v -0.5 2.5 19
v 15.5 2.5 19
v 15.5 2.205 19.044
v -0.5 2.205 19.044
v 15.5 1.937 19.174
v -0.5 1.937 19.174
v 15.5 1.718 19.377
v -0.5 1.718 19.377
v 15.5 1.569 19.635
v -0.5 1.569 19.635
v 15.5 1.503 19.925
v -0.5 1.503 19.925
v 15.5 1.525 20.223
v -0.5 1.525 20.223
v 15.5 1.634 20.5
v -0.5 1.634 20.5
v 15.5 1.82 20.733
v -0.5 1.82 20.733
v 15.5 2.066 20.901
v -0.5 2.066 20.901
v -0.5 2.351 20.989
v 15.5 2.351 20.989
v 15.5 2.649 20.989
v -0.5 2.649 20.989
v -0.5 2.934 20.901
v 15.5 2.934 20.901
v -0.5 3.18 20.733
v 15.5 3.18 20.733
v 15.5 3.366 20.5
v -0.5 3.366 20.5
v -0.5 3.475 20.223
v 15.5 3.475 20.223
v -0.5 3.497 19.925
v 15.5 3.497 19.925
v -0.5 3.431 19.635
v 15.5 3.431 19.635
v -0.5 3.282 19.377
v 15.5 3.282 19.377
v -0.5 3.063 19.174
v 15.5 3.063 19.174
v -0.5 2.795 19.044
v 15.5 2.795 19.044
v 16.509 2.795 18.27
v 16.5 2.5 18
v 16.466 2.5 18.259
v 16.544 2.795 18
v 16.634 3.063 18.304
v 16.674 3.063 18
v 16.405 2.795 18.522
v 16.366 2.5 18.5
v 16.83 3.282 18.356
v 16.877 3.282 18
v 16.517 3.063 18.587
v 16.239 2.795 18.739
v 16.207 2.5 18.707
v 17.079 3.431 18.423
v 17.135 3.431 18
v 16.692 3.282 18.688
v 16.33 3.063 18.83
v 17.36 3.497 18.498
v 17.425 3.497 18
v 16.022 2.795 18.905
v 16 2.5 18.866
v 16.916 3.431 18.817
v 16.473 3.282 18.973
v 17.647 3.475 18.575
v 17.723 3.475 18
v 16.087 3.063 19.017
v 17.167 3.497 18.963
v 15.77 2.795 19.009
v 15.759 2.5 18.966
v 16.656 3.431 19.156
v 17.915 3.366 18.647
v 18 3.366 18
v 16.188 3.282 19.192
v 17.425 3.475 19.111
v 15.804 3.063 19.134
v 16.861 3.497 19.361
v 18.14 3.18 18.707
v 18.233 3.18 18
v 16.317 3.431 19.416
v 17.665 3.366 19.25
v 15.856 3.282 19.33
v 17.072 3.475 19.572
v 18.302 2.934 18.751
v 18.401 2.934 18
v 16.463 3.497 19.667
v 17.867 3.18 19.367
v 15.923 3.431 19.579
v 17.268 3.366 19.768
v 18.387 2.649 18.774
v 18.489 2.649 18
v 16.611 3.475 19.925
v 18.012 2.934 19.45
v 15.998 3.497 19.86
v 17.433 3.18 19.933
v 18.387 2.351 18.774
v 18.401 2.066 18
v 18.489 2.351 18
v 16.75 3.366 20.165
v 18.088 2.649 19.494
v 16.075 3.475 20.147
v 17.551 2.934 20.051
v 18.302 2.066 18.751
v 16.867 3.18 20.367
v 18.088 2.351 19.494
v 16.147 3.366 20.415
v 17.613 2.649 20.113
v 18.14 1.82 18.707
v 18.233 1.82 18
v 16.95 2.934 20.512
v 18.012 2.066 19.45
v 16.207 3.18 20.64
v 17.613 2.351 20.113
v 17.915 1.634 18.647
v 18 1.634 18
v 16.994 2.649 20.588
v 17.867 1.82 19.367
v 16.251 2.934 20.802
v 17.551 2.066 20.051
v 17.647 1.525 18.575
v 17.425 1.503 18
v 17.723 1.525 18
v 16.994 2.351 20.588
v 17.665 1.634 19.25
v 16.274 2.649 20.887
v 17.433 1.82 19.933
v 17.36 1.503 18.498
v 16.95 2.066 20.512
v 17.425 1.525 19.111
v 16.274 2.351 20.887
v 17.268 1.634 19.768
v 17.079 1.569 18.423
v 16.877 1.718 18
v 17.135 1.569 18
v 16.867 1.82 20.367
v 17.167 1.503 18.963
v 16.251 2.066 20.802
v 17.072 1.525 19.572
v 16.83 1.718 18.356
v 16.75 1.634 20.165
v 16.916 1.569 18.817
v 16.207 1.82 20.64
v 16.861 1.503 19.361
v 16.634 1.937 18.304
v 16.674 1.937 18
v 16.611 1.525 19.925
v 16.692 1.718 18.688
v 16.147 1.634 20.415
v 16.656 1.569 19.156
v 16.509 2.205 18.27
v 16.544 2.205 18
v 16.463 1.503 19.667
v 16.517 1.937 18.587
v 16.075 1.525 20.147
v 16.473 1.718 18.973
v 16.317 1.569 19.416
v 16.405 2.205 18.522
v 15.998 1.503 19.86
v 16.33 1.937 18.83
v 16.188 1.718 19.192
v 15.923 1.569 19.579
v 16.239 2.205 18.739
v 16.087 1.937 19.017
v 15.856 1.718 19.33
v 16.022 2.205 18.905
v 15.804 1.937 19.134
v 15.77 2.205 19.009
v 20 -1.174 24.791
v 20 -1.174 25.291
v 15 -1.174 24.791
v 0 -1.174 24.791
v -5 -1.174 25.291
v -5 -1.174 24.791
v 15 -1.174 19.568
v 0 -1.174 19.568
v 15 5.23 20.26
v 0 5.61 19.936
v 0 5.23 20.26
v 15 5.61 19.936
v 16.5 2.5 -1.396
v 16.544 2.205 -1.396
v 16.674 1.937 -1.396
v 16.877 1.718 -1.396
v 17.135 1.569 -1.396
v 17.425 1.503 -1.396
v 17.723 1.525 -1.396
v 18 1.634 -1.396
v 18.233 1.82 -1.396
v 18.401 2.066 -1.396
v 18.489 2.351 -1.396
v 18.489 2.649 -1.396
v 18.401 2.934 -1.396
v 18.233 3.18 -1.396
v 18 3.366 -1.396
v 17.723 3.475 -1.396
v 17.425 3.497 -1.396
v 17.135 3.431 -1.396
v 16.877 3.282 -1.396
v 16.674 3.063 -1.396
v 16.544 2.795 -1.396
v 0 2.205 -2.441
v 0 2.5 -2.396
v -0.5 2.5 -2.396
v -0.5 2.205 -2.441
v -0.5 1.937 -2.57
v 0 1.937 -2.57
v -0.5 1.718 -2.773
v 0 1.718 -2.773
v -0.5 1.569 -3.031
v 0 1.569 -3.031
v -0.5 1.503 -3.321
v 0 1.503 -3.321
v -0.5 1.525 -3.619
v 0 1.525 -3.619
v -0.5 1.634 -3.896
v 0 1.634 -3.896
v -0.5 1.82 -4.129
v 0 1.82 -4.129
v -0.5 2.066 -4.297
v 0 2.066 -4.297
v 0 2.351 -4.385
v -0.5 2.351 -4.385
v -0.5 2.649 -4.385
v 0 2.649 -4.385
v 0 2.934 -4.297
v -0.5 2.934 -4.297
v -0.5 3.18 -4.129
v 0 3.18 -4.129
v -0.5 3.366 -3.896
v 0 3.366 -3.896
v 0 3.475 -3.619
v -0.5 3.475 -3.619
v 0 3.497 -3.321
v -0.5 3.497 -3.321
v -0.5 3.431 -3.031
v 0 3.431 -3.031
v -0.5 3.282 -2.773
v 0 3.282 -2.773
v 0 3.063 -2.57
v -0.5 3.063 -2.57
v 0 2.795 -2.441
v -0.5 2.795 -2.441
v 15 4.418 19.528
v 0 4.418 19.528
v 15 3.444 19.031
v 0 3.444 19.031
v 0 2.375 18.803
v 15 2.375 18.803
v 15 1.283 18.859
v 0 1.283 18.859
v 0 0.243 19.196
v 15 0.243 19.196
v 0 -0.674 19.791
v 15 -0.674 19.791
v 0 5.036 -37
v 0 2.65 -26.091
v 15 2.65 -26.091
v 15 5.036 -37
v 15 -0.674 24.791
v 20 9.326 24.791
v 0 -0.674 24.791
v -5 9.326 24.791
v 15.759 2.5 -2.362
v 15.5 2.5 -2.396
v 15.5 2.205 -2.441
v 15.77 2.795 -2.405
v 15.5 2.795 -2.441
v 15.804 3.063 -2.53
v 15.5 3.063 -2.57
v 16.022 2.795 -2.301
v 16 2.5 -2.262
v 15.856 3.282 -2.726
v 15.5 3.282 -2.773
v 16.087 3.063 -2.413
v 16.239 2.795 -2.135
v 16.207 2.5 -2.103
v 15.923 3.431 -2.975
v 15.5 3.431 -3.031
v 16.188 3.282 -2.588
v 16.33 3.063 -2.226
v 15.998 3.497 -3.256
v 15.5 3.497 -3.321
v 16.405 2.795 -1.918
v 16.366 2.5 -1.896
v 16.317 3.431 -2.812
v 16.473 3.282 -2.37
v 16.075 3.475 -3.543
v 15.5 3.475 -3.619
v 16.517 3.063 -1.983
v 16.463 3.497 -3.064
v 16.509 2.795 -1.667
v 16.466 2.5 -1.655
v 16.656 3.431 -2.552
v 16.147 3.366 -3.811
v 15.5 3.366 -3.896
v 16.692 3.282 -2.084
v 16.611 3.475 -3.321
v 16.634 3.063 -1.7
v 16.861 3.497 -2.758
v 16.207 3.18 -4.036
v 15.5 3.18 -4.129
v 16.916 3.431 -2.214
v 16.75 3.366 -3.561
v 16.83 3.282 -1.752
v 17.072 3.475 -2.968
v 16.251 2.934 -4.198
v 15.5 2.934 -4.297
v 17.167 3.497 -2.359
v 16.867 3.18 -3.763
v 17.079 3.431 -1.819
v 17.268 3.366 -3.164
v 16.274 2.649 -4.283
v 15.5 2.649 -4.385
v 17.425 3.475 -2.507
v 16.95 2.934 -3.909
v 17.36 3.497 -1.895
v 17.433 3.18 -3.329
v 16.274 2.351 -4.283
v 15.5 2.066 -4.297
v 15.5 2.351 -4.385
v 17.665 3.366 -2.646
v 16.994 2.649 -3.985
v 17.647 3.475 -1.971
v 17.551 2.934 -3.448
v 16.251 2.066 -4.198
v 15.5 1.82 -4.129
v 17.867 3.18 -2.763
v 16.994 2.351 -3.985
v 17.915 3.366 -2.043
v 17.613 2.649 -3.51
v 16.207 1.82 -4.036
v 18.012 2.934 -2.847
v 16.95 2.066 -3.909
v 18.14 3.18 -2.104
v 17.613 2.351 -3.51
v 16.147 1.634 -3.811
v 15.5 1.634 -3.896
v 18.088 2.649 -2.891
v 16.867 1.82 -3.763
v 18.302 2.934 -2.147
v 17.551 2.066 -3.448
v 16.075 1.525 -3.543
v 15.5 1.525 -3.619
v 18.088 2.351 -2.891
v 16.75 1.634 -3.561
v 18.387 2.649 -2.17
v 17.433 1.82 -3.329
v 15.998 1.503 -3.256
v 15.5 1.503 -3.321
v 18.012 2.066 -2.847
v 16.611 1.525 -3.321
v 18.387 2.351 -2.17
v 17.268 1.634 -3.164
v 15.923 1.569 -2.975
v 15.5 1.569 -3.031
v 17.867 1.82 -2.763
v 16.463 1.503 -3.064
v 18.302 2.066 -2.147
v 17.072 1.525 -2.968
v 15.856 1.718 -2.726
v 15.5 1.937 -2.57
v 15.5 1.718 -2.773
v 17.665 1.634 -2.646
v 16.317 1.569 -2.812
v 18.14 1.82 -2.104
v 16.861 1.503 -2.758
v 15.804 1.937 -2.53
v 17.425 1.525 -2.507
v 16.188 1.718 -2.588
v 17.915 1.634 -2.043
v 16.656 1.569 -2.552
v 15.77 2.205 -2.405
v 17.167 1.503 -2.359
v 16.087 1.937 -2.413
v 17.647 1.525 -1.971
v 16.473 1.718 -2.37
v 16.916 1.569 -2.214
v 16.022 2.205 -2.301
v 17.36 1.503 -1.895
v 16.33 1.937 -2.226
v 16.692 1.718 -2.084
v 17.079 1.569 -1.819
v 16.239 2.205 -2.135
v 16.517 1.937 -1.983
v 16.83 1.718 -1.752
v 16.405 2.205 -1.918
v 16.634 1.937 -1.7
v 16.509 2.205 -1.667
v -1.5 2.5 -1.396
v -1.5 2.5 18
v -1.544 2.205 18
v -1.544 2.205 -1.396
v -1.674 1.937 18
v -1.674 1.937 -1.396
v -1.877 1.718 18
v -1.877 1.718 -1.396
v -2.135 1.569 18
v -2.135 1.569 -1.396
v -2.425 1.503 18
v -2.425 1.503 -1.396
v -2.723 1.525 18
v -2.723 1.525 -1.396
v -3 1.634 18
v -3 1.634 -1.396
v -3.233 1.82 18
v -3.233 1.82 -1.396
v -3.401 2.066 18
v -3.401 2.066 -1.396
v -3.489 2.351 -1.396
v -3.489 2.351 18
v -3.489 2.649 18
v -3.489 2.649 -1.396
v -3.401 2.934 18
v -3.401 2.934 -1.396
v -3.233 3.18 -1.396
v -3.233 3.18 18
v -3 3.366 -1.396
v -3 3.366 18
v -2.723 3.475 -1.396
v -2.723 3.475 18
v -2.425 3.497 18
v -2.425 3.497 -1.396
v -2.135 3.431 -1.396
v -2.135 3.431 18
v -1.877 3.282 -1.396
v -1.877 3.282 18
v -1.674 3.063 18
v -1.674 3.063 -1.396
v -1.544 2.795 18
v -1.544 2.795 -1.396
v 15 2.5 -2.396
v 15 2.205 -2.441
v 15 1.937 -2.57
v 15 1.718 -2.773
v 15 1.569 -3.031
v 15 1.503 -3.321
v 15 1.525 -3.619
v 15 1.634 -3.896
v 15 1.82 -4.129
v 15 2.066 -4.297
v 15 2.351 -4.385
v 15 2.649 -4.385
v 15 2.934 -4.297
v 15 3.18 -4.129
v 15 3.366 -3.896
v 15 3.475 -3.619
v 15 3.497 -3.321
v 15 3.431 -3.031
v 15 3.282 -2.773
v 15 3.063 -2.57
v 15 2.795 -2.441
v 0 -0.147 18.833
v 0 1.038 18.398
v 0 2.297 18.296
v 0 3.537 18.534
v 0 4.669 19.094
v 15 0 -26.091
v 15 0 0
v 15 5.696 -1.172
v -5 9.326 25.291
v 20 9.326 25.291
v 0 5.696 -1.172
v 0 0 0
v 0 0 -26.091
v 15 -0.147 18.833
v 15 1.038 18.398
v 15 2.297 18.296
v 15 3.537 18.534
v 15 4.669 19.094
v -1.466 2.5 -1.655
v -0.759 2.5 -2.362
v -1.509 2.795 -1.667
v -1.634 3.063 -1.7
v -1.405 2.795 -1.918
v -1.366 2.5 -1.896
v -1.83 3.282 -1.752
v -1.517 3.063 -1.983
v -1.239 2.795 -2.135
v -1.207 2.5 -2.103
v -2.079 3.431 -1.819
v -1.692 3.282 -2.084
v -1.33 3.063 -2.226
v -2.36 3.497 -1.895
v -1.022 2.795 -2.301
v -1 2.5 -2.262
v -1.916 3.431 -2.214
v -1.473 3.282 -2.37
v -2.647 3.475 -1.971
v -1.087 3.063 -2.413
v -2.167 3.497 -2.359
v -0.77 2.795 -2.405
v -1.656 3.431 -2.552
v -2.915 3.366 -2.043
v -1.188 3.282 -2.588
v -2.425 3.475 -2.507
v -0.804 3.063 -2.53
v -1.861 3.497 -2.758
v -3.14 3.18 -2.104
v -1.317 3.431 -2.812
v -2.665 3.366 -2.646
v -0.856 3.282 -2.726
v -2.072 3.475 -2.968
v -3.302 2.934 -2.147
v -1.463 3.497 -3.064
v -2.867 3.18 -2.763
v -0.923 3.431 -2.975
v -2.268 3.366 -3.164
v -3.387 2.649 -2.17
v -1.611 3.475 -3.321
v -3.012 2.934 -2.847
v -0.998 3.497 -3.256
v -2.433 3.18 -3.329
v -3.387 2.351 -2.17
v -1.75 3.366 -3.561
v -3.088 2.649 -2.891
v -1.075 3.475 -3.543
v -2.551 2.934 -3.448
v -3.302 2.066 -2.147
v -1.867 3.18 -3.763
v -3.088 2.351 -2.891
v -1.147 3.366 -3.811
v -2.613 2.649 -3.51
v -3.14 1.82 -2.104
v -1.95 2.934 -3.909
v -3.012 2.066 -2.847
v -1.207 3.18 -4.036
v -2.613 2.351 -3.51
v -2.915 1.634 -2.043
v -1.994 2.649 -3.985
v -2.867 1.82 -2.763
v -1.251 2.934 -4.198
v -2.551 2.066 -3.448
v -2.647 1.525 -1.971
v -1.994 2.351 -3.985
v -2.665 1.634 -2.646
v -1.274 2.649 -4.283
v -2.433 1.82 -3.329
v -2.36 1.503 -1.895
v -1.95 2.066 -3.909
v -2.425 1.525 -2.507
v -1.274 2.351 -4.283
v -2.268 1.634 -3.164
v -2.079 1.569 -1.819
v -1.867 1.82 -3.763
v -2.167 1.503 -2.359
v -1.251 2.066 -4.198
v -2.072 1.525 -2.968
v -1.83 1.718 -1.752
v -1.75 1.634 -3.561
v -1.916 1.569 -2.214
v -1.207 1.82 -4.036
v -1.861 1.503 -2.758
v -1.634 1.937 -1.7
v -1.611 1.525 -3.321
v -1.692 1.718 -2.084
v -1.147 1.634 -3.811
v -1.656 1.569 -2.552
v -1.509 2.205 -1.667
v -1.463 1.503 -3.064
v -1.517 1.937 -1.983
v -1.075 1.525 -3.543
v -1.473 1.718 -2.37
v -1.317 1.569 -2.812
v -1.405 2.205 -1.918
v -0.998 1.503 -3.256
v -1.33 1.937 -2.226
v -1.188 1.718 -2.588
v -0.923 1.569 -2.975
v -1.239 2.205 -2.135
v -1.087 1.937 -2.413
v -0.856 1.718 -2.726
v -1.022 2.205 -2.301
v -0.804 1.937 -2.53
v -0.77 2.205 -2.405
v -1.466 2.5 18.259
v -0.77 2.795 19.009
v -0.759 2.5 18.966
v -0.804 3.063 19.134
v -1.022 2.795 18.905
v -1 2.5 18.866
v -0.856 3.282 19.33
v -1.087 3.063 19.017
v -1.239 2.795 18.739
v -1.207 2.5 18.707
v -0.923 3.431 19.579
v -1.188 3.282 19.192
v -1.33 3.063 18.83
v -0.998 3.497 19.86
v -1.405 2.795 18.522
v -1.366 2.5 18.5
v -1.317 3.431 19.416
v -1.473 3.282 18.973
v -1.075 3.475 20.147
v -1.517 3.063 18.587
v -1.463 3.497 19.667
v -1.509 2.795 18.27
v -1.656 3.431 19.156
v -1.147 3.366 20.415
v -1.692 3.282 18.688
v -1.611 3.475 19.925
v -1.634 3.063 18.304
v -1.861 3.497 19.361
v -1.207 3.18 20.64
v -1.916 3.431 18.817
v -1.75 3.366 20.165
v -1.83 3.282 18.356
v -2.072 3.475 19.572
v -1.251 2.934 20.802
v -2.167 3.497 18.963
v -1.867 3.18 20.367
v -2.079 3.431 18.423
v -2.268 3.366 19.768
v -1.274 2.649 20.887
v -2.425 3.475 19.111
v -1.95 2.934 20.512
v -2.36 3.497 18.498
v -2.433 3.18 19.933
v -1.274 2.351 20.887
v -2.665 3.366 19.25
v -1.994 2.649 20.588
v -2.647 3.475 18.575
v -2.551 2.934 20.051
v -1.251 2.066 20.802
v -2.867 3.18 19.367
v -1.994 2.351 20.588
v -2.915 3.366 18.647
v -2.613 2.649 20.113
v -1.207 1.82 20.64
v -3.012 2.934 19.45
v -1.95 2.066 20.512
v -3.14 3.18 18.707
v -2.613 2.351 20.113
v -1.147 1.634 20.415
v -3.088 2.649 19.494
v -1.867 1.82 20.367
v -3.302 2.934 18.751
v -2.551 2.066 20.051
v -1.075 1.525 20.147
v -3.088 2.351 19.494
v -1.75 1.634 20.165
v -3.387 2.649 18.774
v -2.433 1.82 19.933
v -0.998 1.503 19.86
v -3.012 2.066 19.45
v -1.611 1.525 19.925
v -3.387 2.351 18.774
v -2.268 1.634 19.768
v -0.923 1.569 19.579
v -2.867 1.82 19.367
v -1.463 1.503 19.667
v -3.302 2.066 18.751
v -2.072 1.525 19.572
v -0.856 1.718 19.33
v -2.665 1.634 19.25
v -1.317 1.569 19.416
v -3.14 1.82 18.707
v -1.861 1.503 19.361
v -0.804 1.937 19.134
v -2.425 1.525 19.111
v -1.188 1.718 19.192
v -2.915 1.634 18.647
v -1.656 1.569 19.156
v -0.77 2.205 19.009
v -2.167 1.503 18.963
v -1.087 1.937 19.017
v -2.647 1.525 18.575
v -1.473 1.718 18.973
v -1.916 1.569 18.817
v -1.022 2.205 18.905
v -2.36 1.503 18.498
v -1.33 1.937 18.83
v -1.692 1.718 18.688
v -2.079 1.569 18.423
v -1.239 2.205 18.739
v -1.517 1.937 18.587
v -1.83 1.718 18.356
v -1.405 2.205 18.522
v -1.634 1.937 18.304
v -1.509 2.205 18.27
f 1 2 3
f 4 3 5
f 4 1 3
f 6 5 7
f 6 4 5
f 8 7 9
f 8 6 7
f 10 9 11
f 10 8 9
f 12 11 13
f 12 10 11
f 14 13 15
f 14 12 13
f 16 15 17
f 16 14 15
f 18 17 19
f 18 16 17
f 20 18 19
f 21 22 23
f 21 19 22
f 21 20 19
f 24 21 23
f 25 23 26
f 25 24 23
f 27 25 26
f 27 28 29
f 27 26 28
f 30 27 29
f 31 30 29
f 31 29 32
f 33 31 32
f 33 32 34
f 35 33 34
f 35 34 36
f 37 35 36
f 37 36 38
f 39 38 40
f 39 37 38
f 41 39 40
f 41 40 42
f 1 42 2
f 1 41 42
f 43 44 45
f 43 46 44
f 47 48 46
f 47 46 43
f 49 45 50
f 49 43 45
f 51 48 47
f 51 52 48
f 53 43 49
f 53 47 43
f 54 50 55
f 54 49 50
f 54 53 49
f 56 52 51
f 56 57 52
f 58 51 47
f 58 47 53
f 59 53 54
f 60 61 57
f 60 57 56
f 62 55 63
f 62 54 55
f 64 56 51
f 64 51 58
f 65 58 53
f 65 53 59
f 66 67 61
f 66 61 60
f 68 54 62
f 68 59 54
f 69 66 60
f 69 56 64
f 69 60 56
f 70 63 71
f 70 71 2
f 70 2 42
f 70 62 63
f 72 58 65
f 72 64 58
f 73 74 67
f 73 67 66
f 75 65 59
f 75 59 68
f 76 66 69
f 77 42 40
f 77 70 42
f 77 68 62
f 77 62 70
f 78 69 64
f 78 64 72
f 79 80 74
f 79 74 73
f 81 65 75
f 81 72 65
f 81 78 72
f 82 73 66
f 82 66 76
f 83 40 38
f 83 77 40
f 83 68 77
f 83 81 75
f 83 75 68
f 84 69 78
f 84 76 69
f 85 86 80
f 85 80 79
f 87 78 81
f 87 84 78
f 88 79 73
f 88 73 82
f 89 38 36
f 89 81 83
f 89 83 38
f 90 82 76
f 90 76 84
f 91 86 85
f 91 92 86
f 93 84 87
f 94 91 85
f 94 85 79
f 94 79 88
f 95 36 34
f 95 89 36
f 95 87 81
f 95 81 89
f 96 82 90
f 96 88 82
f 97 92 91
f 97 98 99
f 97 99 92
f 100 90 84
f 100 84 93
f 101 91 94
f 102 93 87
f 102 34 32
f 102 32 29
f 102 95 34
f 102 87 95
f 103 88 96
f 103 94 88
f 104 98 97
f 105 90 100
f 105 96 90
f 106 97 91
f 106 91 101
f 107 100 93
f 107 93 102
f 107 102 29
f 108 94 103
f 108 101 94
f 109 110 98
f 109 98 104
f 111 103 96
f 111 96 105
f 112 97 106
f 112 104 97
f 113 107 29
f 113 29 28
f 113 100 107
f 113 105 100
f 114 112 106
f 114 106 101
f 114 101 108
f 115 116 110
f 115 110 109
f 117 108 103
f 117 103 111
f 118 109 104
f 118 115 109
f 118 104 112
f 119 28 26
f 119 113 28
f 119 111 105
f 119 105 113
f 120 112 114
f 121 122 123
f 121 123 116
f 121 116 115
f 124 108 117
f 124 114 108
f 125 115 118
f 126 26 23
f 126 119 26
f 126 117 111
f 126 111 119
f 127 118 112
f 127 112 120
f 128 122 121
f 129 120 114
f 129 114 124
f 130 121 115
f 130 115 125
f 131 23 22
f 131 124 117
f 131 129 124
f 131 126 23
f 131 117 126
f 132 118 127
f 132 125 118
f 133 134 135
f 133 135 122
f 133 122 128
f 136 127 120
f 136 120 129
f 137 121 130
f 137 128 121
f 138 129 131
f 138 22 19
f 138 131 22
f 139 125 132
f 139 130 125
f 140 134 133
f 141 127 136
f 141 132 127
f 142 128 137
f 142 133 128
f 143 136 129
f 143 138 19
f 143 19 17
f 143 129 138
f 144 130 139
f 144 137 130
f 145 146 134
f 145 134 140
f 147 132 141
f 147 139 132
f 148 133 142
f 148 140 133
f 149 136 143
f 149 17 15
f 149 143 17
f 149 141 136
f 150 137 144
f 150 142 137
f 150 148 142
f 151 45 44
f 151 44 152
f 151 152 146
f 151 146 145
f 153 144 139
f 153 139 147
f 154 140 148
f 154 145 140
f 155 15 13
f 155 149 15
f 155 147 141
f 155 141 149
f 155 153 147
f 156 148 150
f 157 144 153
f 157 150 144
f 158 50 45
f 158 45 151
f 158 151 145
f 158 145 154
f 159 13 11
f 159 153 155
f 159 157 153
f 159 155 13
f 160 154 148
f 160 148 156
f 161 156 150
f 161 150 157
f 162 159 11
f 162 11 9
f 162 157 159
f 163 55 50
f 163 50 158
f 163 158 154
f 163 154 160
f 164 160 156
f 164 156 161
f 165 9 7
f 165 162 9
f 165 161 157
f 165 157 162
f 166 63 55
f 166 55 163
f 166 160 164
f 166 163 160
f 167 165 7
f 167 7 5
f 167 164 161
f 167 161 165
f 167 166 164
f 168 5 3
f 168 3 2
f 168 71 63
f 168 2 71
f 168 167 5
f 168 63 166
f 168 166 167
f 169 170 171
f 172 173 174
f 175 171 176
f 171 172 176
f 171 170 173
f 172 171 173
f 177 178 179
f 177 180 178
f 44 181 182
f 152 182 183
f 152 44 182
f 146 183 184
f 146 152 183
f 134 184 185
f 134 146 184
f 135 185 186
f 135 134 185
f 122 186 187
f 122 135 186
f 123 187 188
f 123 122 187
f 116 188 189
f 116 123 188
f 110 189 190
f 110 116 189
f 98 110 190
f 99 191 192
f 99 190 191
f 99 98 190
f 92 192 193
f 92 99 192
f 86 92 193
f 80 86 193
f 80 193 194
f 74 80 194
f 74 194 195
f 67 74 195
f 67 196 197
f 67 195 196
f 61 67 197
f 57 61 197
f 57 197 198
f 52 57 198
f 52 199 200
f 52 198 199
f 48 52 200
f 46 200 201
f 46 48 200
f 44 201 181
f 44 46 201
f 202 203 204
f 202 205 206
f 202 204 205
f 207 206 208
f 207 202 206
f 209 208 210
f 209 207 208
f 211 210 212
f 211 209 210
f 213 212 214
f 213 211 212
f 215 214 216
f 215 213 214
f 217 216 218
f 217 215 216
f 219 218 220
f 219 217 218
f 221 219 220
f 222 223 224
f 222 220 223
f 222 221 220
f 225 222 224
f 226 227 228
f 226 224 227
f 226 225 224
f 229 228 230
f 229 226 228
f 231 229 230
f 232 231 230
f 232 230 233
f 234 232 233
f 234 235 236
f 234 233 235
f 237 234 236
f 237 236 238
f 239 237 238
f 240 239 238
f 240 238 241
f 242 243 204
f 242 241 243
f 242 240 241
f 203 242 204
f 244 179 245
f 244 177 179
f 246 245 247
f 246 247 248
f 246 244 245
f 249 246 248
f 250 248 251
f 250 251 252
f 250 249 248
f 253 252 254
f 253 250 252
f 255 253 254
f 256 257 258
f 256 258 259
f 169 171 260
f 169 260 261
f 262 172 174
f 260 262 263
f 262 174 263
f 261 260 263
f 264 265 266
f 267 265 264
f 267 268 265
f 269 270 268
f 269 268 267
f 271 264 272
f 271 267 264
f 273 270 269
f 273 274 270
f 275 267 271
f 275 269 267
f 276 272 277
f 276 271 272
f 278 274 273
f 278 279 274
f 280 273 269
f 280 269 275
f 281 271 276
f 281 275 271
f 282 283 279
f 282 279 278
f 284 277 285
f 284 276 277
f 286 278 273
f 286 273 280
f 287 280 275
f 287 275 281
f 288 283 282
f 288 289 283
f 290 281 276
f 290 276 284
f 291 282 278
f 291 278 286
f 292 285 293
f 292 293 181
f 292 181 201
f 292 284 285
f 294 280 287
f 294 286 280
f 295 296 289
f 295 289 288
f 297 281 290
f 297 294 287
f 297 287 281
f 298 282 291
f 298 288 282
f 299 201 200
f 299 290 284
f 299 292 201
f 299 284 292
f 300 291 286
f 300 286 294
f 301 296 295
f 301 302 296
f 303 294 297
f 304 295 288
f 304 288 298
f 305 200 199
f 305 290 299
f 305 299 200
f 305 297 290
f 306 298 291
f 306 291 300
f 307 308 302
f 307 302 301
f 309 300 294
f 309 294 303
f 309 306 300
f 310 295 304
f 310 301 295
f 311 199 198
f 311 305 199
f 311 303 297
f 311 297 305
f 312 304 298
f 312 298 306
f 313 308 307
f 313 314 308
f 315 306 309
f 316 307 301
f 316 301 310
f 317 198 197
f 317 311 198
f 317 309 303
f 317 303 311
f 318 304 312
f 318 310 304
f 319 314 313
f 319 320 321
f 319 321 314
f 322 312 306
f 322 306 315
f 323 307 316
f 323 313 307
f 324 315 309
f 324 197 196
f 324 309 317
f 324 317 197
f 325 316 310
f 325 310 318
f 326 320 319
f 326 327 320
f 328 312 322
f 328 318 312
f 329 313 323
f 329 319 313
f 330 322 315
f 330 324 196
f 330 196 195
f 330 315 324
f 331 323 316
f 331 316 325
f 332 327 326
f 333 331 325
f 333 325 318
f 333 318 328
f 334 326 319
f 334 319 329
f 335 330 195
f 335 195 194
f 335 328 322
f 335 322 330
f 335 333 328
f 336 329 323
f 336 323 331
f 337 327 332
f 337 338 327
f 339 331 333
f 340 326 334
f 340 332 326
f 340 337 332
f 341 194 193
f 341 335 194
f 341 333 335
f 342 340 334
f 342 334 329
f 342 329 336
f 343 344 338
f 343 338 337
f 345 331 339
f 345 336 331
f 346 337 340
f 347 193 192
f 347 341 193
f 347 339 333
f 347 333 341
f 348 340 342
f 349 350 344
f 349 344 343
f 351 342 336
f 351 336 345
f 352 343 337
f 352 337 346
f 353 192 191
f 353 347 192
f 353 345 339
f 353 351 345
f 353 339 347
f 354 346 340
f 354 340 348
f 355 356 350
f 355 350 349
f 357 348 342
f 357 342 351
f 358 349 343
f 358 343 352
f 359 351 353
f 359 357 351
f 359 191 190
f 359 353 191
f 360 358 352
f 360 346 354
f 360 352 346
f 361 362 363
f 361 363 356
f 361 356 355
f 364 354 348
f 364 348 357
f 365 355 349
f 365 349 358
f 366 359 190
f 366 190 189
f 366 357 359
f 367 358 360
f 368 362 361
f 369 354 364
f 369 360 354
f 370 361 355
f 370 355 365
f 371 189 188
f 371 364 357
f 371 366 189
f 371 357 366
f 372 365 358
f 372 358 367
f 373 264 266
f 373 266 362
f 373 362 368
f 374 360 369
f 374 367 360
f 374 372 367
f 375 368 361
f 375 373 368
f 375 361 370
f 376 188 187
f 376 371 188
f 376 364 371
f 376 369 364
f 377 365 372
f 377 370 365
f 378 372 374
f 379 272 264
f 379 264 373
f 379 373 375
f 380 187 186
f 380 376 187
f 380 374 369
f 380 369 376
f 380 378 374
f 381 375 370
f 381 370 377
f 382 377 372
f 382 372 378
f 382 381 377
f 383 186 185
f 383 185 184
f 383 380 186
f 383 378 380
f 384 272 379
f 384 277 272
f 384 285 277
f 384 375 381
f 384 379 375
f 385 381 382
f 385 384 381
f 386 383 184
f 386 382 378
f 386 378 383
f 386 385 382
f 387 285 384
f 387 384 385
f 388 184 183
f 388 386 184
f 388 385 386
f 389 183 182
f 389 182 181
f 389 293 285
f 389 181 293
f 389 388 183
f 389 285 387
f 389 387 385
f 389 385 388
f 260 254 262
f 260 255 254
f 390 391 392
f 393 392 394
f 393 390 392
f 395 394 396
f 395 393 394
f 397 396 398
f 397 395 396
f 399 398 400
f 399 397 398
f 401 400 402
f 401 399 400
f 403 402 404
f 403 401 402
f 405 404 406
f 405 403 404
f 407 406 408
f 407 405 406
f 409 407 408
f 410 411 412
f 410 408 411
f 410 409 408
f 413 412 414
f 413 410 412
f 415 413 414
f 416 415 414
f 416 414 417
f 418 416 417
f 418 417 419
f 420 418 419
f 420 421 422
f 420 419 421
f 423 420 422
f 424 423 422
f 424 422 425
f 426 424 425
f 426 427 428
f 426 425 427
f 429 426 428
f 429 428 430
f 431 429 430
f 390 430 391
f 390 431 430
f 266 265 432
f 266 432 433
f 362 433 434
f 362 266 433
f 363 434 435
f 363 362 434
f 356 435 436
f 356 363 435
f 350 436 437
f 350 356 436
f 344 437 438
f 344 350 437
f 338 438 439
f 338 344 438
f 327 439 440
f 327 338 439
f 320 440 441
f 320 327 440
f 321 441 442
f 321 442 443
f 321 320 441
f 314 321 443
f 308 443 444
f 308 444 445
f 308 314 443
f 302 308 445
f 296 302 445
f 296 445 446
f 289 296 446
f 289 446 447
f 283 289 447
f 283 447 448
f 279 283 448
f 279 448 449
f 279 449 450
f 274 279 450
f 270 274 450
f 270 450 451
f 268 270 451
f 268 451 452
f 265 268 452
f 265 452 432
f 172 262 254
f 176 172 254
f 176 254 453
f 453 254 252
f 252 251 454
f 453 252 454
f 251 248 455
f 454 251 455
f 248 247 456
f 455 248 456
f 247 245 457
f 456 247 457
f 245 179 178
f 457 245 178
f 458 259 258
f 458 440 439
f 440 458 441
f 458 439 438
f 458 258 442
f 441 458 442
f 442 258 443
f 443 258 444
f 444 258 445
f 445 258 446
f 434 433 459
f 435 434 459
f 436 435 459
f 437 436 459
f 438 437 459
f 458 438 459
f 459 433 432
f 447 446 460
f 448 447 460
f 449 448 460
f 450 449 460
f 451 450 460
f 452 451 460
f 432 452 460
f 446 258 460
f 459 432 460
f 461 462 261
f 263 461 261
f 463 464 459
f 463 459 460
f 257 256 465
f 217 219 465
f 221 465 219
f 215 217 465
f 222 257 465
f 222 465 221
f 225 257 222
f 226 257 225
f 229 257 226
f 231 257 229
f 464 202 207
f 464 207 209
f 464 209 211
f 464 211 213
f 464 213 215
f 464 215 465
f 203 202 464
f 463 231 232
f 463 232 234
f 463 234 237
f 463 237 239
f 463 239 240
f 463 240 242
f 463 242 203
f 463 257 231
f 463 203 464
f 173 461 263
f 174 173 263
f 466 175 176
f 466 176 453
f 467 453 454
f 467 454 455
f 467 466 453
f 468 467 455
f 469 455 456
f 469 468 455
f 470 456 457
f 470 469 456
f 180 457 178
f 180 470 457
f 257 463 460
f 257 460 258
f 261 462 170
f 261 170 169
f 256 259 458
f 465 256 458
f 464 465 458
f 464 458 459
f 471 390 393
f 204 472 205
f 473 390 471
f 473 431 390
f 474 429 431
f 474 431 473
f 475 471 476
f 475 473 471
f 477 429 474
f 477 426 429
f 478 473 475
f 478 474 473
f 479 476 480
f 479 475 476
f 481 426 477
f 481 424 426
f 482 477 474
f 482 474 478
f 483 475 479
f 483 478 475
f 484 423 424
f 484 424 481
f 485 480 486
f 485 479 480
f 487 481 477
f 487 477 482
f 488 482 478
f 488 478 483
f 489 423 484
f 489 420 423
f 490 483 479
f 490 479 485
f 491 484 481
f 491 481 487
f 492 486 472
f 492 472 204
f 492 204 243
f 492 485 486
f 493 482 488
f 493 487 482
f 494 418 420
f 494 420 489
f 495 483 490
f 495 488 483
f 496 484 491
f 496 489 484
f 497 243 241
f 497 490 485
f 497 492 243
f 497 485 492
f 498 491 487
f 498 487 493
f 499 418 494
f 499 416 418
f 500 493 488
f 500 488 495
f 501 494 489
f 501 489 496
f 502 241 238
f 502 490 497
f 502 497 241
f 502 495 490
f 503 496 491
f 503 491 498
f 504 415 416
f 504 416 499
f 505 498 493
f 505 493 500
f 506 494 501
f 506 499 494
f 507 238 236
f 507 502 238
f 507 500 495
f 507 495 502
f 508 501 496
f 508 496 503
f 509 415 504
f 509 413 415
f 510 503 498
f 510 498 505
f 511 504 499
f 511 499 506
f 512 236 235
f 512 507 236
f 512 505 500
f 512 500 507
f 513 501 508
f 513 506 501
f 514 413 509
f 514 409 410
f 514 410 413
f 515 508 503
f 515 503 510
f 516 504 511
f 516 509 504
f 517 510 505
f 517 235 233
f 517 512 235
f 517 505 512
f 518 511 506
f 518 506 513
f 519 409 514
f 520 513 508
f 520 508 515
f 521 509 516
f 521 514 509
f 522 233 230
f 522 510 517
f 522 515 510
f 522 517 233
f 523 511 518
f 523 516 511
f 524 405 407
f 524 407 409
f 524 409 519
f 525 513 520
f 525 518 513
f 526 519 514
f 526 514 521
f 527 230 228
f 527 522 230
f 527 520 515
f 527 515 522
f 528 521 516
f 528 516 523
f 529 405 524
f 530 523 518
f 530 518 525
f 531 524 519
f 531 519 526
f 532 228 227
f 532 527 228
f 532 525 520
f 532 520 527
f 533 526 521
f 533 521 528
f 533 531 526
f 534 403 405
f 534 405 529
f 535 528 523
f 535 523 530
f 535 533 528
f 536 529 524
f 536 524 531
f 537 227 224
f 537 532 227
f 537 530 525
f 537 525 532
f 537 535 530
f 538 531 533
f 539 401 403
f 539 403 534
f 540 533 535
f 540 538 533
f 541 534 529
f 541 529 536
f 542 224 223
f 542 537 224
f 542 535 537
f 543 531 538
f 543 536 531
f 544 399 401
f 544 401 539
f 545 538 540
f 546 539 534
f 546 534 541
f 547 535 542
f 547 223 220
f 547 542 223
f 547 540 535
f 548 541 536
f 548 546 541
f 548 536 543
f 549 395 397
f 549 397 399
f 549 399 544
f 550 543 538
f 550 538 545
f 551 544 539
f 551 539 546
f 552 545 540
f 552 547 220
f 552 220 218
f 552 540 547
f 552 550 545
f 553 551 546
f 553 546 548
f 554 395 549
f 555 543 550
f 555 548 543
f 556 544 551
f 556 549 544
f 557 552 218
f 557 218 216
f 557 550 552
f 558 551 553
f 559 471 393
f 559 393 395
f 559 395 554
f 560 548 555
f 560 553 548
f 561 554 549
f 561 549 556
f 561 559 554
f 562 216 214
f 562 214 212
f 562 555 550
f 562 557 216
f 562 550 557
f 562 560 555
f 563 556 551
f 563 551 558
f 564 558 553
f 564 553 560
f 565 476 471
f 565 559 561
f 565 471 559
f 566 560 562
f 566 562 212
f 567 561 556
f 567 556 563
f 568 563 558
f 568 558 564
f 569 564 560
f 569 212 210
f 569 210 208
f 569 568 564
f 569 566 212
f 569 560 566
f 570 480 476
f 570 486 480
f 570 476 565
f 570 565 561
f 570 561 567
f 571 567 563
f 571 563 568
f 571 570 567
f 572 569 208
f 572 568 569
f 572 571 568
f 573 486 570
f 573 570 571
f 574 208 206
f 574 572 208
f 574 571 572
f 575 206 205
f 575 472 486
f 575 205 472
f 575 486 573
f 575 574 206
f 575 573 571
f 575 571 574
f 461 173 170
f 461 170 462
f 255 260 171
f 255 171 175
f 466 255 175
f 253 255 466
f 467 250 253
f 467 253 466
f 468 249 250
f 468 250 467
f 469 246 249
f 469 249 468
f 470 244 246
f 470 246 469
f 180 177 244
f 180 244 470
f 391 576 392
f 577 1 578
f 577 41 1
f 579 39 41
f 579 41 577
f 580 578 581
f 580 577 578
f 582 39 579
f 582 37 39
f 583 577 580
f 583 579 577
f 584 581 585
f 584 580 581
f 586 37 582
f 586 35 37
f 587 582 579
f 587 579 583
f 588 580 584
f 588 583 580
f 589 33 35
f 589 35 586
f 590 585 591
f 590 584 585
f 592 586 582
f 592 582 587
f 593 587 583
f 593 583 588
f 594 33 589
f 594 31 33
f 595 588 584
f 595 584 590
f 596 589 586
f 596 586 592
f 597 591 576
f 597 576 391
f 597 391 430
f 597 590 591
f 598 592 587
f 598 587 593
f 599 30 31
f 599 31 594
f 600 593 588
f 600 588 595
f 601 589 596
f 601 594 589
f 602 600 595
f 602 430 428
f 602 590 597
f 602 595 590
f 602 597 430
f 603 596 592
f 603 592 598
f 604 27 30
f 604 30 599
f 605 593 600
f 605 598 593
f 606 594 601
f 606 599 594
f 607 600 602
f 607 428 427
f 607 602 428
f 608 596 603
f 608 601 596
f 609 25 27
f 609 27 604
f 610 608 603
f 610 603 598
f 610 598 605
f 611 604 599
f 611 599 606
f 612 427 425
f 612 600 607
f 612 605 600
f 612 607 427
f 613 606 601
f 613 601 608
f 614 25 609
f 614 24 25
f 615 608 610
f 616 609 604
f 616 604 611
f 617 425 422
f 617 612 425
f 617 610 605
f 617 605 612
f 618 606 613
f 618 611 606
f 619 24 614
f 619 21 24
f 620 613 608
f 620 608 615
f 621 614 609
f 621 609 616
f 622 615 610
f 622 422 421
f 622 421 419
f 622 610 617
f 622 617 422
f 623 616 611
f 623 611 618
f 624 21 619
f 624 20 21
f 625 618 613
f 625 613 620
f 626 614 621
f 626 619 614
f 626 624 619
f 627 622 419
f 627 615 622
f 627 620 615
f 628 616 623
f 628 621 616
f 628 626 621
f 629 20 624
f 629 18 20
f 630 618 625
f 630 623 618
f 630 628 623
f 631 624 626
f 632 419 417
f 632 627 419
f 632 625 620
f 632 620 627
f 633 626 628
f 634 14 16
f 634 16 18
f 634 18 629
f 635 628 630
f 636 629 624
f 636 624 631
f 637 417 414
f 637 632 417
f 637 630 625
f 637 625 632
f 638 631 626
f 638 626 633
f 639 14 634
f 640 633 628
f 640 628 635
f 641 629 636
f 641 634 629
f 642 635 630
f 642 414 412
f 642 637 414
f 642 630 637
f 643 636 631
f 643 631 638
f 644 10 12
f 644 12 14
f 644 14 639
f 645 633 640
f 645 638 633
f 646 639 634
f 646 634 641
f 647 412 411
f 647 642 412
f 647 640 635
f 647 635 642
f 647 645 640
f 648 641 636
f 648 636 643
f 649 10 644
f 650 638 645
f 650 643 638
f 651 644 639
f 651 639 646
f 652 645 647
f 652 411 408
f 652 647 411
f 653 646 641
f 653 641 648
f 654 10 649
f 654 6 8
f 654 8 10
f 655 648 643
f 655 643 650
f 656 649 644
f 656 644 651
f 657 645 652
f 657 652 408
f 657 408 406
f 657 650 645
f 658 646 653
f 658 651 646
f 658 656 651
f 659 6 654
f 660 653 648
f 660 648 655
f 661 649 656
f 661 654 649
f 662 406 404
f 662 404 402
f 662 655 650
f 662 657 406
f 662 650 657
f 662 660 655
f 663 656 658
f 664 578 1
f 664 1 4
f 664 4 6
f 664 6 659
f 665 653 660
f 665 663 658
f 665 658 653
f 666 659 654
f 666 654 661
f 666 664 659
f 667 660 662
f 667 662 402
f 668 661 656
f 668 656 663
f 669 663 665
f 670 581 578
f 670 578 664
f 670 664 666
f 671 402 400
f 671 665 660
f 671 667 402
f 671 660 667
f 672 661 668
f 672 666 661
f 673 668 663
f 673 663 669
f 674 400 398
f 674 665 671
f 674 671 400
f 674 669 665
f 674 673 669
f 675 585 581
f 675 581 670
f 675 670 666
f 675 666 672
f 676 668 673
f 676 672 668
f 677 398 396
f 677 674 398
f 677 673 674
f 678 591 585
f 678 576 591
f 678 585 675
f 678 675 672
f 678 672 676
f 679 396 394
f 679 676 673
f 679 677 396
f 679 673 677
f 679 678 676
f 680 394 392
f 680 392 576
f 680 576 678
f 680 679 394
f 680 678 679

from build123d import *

# Parameters (mm, degrees)
BOSS_EXTRUDE1_DEPTH      = 15
SWEEP1_PROFILE_R         = 1
BOSS_EXTRUDE2_DEPTH      = 7.5
BOSS_EXTRUDE3_DEPTH      = 5
BOSS_EXTRUDE3_DEPTH_BACK = 20
SKETCH14_W               = 0.5
SKETCH14_H               = 10.5


with BuildPart() as part:
    # Sketch1 → Boss-Extrude1 (new body)
    with BuildSketch(Plane(origin=(0, 0, 0), x_dir=(0, 0, -1), z_dir=(1, 0, 0))):
        Polygon((0, 0), (1.171850901, 5.696384018), (26.090909091, 2.649743604), (37, 5.036278595), (26.090909091, 0), align=None)
    extrude(amount=BOSS_EXTRUDE1_DEPTH)

    # Sweep1: sweep along a path in Sketch2
    with BuildLine(Plane(origin=(0, 2.5, 0), x_dir=(-1, 0, 0), z_dir=(0, -1, 0))) as sweep1_path:
        Line((-15, 3.39620624), (-15.5, 3.39620624))
        ThreePointArc((-15.5, 3.39620624), (-16.914213562, 2.810419803), (-17.5, 1.39620624))
        Line((-17.5, 1.39620624), (-17.5, -18))
        ThreePointArc((-17.5, -18), (-16.914213562, -19.414213562), (-15.5, -20))
        Line((-15.5, -20), (0.5, -20))
        ThreePointArc((0.5, -20), (1.914213562, -19.414213562), (2.5, -18))
        Line((2.5, -18), (2.5, 1.39620624))
        ThreePointArc((2.5, 1.39620624), (1.914213562, 2.810419803), (0.5, 3.39620624))
        Line((0.5, 3.39620624), (0, 3.39620624))
    # Sweep1 profile (on start of the path) → Sweep1 (sweep)
    with BuildSketch(Plane(origin=(15, 2.5, -3.39620624), x_dir=(0, 0, 1), z_dir=(1, 0, 0))):
        Circle(SWEEP1_PROFILE_R)
    sweep(path=sweep1_path.line)


with BuildPart() as body_2:
    # Sketch13 → Boss-Extrude2 (new, symmetric)
    with BuildSketch(Plane(origin=(7.5, 0, 0), x_dir=(0, 0, -1), z_dir=(1, 0, 0))):
        with BuildLine():
            Line((-19.790552216, -0.674159606), (-24.790552216, -0.674159606))
            Line((-24.790552216, -0.674159606), (-24.790552216, 9.325840394))
            Line((-24.790552216, 9.325840394), (-25.290552216, 9.325840394))
            Line((-25.290552216, 9.325840394), (-25.290552216, -1.174159606))
            Line((-25.290552216, -1.174159606), (-19.567594031, -1.174159606))
            ThreePointArc((-19.567594031, -1.174159606), (-18.296290964, 2.297128651), (-19.935793988, 5.610447755))
            Line((-19.935793988, 5.610447755), (-20.260199098, 5.229972625))
            ThreePointArc((-20.260199098, 5.229972625), (-18.802589835, 2.375173563), (-19.790552216, -0.674159606))
        make_face()
    extrude(amount=BOSS_EXTRUDE2_DEPTH, both=True)

    # Sketch14 → Boss-Extrude3 (add, two sides: drawn at the far end of the back side and taken through both)
    with BuildSketch(Plane(origin=(15, 0, 0), x_dir=(0, 0, -1), z_dir=(1, 0, 0)).offset(-BOSS_EXTRUDE3_DEPTH_BACK)):
        with Locations((-25.040552216, 4.075840394)):
            Rectangle(SKETCH14_W, SKETCH14_H)
    extrude(amount=BOSS_EXTRUDE3_DEPTH + BOSS_EXTRUDE3_DEPTH_BACK)


solid = Compound([part.part, body_2.part])
